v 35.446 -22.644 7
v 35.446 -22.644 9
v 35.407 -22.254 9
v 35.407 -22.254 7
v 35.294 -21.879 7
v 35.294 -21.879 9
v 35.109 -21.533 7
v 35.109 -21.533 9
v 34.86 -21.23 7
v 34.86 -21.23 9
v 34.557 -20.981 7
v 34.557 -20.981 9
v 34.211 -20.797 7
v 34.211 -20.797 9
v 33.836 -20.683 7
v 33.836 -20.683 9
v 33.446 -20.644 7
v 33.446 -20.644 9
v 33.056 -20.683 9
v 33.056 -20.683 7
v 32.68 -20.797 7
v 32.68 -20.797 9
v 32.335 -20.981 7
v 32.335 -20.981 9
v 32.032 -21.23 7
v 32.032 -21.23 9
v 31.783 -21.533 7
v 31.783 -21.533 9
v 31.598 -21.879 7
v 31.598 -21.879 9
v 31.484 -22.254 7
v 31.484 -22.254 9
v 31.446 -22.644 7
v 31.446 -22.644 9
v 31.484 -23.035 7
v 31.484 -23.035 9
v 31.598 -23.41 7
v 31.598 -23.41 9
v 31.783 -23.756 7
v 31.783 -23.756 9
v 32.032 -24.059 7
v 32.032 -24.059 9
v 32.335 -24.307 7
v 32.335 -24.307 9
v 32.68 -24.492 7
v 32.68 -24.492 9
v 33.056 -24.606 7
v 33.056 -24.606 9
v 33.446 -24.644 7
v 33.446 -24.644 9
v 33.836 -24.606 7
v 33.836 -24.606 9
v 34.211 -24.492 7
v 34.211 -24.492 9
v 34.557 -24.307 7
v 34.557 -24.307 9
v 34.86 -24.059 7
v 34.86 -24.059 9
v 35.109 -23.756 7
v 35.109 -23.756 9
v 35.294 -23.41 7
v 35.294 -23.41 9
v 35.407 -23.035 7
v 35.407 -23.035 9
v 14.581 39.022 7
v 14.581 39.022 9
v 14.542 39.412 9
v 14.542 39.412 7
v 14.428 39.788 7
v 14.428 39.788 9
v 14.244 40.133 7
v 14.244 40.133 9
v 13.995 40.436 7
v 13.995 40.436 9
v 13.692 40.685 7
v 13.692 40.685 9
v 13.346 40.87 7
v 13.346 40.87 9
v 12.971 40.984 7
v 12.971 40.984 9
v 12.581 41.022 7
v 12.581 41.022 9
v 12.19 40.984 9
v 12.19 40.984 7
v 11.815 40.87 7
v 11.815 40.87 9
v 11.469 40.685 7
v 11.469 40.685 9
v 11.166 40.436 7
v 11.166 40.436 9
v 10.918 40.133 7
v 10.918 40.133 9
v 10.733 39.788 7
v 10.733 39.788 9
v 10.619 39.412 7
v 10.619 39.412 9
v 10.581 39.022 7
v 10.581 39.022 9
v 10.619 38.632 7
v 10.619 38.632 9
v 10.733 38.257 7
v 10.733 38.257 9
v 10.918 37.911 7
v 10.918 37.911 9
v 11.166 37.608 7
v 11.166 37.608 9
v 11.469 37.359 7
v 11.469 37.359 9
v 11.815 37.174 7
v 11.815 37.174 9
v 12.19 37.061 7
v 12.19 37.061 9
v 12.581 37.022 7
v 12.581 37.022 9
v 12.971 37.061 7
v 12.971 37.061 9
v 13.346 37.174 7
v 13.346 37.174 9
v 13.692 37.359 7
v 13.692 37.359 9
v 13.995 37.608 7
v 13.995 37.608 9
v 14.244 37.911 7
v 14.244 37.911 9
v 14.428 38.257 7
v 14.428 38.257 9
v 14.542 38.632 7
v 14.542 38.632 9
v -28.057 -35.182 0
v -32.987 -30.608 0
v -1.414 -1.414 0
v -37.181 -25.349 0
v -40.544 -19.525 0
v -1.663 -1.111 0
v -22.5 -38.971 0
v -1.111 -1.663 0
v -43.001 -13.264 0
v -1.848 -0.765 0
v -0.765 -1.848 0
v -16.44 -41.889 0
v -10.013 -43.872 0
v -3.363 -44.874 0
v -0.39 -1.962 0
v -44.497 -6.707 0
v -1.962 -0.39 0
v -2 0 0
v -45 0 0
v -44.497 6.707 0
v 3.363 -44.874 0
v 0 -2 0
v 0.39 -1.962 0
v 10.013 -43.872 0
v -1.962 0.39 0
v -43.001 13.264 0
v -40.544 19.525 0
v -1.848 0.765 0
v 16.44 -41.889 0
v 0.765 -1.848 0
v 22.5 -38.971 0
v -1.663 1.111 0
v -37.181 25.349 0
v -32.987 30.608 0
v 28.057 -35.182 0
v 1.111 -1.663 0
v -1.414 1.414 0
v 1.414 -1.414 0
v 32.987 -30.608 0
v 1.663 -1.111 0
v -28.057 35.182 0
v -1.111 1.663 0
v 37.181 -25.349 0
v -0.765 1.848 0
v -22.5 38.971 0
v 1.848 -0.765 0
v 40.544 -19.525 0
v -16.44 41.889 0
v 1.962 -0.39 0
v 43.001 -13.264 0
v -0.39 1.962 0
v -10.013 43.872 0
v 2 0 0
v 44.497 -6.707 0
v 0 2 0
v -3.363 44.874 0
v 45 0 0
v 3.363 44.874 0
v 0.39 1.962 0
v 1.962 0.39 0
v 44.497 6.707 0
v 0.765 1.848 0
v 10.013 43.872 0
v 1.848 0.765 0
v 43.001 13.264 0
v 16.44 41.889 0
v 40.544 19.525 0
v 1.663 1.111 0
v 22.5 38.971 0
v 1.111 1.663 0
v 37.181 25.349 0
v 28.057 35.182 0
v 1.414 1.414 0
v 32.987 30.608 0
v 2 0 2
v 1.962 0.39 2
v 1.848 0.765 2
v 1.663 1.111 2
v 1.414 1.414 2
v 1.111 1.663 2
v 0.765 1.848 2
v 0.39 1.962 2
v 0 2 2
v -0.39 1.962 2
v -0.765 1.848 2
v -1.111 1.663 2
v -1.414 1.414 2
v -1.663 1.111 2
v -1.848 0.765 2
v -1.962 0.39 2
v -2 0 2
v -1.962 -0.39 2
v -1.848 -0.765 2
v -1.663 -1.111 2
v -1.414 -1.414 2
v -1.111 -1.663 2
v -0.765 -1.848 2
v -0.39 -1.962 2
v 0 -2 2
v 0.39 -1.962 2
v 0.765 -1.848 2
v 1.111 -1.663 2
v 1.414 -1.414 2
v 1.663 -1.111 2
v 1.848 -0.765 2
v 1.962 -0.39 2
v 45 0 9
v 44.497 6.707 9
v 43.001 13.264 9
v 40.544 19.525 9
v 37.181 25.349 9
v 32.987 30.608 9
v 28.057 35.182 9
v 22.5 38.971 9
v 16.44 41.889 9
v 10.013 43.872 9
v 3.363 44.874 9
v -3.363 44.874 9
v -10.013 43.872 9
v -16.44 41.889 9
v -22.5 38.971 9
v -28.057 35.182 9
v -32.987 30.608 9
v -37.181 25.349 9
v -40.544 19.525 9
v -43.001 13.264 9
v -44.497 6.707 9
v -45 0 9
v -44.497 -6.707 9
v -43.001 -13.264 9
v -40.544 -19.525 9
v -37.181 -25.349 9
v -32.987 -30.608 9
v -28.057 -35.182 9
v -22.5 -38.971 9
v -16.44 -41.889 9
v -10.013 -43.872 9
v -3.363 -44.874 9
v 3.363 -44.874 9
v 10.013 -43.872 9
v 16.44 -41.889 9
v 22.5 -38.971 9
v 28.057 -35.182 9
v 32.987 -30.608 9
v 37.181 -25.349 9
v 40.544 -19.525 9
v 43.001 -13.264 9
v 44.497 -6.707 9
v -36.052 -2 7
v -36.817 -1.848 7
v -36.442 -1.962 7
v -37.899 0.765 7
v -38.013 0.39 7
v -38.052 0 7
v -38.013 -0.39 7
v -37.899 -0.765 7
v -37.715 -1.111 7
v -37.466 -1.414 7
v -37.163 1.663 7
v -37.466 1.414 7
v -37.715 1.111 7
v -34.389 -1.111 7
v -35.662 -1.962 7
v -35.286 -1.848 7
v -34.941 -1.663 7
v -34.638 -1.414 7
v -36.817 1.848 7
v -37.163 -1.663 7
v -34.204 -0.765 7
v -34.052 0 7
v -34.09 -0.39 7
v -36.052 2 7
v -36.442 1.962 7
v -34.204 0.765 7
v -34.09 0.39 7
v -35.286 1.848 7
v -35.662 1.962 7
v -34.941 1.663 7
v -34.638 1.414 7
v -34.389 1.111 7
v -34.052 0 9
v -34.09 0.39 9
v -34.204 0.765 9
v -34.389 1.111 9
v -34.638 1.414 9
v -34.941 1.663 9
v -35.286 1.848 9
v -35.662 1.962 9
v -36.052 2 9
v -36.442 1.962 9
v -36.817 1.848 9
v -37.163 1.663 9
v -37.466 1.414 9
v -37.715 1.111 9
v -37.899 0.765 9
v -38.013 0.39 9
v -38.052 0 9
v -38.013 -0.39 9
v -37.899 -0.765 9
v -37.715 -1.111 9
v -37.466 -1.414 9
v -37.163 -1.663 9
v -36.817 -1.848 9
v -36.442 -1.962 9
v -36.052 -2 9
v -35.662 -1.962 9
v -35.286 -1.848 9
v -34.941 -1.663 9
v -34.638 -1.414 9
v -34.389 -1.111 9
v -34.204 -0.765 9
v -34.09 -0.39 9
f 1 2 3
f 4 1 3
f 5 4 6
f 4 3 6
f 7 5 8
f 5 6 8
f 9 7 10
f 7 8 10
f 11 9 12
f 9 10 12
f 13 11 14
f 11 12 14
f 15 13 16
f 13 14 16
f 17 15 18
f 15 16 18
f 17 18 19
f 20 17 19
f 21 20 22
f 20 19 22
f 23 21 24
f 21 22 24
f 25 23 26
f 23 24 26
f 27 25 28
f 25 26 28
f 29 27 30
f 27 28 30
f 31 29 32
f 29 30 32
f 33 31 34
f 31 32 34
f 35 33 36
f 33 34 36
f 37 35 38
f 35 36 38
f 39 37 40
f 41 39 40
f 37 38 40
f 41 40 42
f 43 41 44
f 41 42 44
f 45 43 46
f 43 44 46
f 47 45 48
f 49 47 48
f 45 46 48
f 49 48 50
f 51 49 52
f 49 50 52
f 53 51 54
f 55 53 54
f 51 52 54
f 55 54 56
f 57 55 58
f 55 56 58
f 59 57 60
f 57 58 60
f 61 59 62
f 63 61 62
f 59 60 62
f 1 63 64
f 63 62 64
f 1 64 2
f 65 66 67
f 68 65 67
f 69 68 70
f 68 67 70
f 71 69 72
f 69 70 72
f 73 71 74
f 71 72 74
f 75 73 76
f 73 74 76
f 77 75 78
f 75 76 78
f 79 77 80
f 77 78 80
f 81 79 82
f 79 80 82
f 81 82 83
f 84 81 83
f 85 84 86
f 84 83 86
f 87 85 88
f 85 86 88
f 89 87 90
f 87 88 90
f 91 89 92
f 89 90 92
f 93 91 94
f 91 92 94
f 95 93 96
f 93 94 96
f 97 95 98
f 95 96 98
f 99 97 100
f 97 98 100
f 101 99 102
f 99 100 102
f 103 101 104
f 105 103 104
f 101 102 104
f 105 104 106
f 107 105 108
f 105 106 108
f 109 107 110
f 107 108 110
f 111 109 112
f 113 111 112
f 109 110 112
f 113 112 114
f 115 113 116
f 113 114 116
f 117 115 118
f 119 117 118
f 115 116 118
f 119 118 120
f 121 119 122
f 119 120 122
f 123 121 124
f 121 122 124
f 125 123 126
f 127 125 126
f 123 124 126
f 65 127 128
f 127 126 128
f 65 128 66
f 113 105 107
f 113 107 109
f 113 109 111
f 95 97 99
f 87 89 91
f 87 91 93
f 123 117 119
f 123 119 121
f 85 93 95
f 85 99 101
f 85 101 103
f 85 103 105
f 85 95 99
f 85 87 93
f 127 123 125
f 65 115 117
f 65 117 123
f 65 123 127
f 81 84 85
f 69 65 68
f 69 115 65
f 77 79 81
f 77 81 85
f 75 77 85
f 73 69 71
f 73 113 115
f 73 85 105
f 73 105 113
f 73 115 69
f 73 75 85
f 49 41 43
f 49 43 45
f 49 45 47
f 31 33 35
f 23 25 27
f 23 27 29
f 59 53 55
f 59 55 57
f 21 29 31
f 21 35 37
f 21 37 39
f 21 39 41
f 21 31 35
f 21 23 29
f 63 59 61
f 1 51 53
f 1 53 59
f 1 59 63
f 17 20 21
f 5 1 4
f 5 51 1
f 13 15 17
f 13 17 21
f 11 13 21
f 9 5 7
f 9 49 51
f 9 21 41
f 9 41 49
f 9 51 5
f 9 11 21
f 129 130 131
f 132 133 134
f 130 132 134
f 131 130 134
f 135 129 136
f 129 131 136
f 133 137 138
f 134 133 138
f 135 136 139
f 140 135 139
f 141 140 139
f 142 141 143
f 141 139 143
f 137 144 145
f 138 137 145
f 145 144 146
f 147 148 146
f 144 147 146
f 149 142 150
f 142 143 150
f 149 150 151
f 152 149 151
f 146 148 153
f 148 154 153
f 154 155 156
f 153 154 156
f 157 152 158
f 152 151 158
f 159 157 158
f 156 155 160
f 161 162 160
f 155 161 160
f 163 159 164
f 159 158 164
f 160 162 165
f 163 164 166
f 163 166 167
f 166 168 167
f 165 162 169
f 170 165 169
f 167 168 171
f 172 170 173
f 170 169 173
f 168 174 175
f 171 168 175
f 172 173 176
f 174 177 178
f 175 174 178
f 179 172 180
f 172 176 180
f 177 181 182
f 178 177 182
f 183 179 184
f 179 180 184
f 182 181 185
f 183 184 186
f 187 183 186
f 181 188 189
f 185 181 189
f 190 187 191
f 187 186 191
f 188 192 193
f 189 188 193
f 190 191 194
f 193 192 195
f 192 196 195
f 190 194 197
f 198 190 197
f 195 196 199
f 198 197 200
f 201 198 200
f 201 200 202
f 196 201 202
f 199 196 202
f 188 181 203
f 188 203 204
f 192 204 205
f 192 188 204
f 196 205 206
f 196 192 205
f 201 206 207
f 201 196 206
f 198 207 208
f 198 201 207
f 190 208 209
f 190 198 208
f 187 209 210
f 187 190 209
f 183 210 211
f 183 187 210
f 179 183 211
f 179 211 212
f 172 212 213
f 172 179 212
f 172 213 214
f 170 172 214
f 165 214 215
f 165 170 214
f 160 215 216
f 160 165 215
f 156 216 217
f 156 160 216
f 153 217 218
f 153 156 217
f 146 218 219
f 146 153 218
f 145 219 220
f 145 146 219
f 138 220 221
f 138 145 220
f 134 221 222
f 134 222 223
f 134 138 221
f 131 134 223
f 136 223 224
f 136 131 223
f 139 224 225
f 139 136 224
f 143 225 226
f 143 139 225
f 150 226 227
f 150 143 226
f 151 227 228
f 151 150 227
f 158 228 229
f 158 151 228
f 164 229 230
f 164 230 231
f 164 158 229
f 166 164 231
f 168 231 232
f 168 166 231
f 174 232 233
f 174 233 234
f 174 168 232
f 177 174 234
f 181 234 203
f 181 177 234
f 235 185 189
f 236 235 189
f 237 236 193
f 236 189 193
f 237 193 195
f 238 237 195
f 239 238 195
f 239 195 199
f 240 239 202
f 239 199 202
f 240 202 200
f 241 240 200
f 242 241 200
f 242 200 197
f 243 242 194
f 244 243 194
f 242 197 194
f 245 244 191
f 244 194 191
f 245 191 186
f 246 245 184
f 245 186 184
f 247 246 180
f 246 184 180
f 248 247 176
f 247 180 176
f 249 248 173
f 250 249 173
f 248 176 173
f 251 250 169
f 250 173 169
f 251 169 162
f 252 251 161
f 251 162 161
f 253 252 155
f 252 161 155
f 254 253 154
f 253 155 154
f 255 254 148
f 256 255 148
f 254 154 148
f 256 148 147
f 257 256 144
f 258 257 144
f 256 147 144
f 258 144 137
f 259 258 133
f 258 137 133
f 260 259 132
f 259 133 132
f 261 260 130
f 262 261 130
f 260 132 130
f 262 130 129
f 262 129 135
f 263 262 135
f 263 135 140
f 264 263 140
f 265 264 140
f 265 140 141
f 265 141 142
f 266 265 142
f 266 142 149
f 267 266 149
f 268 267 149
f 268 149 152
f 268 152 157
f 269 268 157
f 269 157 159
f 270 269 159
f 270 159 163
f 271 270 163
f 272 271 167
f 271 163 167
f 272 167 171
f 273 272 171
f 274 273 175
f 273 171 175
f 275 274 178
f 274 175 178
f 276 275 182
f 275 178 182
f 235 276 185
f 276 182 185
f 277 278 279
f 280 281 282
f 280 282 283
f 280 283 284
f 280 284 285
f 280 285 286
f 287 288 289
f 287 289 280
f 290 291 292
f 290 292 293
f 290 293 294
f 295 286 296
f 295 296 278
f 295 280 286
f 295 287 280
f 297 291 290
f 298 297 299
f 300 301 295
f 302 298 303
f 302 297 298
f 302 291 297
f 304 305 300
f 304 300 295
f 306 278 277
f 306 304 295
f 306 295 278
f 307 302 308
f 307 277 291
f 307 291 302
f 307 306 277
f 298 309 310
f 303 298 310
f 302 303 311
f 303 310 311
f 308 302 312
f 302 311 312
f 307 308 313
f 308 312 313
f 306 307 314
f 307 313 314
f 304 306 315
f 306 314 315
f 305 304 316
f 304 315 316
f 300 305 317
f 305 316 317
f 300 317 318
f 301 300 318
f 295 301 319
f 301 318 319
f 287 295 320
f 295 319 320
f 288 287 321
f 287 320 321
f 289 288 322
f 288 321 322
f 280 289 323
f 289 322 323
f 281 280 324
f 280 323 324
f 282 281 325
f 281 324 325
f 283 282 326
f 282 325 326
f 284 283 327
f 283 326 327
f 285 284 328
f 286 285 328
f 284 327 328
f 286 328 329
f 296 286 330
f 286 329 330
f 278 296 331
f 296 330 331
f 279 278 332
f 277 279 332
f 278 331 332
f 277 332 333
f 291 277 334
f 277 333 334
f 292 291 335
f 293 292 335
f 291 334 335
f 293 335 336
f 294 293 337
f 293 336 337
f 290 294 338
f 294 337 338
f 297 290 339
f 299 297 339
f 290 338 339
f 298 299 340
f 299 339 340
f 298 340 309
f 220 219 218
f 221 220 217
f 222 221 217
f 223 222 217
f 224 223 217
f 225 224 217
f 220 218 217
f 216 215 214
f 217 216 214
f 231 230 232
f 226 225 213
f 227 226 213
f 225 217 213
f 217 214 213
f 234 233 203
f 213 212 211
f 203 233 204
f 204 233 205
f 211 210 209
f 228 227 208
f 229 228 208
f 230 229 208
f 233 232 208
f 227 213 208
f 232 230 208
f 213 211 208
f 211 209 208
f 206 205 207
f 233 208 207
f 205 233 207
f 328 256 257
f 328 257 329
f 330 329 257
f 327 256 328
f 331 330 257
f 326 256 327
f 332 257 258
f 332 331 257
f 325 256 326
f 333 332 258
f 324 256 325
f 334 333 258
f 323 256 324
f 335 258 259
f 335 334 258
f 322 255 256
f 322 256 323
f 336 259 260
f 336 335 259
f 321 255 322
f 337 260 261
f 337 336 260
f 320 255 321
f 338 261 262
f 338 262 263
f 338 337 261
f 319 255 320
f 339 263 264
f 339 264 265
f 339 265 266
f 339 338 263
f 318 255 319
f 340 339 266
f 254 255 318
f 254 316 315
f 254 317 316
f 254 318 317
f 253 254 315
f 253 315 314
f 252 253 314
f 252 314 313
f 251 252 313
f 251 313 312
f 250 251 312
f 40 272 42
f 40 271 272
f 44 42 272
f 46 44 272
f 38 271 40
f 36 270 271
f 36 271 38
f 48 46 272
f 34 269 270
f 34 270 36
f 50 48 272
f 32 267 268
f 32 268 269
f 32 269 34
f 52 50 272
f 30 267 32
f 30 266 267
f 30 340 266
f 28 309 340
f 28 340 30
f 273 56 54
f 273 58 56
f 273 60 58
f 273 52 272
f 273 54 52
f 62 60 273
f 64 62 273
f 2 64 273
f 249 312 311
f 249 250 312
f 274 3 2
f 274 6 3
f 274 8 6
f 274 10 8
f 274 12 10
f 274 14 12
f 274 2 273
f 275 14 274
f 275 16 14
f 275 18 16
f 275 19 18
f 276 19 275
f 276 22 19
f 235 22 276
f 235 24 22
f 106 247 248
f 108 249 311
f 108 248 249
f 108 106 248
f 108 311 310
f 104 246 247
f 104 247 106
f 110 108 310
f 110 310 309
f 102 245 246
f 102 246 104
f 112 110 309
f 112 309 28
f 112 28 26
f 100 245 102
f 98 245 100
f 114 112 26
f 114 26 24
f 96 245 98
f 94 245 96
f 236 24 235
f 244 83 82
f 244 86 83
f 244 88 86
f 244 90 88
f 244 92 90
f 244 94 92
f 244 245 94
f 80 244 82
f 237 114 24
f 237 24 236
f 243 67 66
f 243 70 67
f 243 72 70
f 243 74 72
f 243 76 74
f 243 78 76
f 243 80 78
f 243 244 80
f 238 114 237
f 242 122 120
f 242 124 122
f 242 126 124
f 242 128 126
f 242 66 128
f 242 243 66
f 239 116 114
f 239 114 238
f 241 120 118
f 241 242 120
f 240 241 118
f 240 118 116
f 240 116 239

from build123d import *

# Parameters (mm, degrees)
F0_R     = 45
F0_R_2   = 2
F1_DEPTH = 9
F2_DEPTH = 2
F3_R     = 2
F4_DEPTH = 2


with BuildPart() as f1:
    # F0 (on Top) → F1 (new body)
    with BuildSketch(Plane.XY):
        Circle(F0_R)
        Circle(F0_R_2, mode=Mode.SUBTRACT)
        Circle(F0_R_2)
    extrude(amount=F1_DEPTH)

    # F0 (on Top) → F2 (cut)
    with BuildSketch(Plane.XY):
        Circle(F0_R_2)
    extrude(amount=F2_DEPTH, mode=Mode.SUBTRACT)

    # F3 (on face) → F4 (cut)
    with BuildSketch(Plane.XY.offset(9)):
        with Locations((-36.051724, 0)):
            Circle(F3_R)
        with Locations((12.580568, 39.022164)):
            Circle(F3_R)
        with Locations((33.445747, -22.644383)):
            Circle(F3_R)
    extrude(amount=-F4_DEPTH, mode=Mode.SUBTRACT)


solid = f1.part
